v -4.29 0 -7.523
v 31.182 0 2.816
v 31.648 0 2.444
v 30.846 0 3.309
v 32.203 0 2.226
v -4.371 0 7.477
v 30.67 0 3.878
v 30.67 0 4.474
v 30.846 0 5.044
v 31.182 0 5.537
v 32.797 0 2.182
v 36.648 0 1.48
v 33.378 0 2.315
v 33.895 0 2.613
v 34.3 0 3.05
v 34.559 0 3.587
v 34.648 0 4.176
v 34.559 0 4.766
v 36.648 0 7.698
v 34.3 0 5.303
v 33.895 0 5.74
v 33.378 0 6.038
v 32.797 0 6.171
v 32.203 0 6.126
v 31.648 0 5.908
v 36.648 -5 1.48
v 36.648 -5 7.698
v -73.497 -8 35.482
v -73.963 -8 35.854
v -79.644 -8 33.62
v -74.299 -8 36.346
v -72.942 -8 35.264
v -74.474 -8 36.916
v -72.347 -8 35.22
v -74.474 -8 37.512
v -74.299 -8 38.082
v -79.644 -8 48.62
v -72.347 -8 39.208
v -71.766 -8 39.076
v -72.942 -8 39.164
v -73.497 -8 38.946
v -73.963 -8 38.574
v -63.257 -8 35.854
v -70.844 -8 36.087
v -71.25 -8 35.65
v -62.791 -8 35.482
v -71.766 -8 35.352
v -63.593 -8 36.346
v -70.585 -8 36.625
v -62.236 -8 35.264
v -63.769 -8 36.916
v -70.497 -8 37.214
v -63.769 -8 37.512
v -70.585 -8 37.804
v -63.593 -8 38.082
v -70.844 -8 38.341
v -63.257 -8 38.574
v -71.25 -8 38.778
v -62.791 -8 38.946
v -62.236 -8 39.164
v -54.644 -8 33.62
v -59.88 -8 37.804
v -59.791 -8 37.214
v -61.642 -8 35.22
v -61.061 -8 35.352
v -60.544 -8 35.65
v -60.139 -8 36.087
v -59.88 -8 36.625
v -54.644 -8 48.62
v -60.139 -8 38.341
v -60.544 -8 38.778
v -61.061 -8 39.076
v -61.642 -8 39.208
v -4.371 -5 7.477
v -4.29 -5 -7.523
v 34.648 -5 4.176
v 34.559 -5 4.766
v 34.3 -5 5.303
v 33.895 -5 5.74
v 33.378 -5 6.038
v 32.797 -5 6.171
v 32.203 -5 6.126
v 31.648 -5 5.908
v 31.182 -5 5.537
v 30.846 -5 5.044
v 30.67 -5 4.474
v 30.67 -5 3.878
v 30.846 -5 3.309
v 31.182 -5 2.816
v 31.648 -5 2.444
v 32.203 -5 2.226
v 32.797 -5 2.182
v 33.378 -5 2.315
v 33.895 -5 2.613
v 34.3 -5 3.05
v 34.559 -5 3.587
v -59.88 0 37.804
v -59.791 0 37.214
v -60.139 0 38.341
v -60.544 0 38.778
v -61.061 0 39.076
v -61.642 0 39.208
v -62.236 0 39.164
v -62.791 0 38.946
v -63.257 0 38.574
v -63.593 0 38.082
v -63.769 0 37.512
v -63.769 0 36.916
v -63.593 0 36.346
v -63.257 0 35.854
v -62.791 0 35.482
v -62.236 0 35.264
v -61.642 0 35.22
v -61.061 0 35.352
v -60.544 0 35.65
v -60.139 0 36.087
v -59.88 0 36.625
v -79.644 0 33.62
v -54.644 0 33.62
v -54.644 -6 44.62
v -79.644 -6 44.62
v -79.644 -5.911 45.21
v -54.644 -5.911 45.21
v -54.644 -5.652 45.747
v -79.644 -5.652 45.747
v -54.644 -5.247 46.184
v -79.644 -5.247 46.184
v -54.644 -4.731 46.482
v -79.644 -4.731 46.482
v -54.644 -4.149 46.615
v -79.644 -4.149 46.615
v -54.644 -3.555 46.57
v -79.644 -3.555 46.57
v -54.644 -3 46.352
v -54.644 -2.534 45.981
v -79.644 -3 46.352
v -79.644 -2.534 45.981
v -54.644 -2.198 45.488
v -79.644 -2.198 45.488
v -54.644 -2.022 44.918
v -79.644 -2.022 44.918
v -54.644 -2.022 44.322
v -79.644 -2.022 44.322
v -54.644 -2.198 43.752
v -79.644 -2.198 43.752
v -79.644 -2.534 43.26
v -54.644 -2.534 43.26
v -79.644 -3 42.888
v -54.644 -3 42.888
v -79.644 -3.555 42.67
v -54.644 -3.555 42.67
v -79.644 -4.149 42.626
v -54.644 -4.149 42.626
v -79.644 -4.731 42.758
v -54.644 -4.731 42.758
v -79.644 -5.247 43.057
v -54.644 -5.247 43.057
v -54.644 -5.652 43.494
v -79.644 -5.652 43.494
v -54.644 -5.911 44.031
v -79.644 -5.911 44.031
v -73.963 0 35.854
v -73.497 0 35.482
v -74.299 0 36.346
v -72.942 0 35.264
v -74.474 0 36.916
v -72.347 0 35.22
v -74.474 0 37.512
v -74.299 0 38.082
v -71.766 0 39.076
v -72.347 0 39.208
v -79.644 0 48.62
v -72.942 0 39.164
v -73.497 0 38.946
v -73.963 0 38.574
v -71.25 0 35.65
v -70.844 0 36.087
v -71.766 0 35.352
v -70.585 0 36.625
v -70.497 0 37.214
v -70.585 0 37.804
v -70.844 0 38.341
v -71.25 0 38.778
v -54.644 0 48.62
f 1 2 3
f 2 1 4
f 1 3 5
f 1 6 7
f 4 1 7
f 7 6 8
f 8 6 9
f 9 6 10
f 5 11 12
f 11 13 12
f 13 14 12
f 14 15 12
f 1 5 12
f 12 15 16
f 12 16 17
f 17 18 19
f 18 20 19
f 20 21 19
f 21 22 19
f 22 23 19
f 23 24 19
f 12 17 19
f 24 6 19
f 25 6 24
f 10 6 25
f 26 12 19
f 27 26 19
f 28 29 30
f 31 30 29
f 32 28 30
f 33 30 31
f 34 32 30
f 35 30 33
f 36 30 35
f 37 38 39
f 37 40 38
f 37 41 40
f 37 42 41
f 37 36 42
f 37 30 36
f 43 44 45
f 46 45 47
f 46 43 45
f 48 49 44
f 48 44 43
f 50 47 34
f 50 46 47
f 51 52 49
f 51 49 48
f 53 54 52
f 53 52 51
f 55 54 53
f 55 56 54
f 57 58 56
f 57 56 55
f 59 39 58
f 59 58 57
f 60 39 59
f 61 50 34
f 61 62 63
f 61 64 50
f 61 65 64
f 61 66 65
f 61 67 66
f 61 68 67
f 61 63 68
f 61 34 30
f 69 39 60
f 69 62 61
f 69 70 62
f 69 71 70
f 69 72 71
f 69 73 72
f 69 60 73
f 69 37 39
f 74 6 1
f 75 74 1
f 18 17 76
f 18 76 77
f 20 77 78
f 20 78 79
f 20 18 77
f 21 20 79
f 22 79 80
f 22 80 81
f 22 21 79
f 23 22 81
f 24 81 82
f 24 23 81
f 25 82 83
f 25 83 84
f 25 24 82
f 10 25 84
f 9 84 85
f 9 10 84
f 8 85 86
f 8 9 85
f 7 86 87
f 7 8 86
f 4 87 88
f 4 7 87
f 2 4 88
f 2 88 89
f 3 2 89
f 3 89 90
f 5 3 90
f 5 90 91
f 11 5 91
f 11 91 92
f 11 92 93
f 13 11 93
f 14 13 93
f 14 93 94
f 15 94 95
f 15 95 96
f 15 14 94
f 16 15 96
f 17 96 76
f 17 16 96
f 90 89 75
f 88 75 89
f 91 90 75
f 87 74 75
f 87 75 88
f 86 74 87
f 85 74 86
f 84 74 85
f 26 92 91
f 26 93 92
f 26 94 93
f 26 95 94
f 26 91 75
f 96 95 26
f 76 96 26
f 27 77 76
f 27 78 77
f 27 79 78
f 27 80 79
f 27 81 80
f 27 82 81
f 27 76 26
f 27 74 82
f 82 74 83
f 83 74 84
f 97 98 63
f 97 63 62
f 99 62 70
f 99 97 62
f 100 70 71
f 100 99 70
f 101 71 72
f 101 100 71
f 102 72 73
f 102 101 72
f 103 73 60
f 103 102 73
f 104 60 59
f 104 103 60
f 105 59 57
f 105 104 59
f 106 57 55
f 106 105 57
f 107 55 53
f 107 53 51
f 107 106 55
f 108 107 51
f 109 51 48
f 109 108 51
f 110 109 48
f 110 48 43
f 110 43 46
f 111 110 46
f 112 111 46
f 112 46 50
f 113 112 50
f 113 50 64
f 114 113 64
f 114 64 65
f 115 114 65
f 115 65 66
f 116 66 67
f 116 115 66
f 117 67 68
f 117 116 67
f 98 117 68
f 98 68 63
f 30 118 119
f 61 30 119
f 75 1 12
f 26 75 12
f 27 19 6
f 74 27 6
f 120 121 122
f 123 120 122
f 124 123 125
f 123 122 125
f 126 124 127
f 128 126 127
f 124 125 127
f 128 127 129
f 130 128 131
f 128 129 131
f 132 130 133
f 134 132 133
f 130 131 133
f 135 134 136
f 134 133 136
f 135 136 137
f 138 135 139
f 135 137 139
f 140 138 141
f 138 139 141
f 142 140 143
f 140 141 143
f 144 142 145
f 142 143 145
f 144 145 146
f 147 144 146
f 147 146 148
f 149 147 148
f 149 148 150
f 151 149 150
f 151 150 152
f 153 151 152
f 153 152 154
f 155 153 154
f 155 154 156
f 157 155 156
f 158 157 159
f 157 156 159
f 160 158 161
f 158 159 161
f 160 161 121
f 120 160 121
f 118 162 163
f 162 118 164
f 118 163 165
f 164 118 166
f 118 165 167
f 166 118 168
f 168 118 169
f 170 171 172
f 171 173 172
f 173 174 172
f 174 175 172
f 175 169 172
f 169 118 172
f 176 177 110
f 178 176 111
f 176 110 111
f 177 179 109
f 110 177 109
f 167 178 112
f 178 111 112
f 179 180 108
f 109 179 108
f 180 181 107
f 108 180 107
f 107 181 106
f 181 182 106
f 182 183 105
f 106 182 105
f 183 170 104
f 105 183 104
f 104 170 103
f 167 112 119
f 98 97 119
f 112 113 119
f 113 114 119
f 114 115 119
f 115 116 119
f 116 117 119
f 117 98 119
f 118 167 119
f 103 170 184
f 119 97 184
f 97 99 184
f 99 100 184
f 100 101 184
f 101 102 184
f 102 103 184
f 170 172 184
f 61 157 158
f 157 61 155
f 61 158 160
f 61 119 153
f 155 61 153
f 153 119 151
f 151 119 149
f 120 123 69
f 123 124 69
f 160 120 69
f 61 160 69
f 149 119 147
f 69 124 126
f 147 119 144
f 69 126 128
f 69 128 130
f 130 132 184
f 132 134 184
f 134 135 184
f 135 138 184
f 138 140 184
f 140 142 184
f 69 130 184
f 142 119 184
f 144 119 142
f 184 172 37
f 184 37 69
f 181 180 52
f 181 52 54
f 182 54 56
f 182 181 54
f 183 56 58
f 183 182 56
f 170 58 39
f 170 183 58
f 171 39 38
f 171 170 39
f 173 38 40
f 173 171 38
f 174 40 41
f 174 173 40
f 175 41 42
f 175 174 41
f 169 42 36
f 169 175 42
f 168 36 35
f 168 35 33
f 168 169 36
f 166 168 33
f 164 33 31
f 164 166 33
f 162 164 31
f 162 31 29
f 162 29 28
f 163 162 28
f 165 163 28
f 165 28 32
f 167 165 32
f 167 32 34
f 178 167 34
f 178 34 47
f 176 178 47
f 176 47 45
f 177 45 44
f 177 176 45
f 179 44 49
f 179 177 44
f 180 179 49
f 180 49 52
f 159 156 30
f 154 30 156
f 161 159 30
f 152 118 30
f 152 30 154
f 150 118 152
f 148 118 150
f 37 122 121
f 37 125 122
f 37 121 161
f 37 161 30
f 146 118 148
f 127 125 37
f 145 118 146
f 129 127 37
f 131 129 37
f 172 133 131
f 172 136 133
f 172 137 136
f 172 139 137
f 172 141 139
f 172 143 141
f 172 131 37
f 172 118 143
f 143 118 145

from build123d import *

# Parameters (mm, degrees)
F0_R     = 2
F1_DEPTH = 5
F2_W     = 25
F2_H     = 15
F2_R     = 2
F3_DEPTH = 8
F4_R     = 2
F5_DEPTH = 25


with BuildPart() as f1:
    # F0 (on Front) → F1 (new body)
    with BuildSketch(Plane.XZ):
        Polygon((36.647806, 7.697929), (-4.370547, 7.476518), (-4.289581, -7.523264), (36.647806, 1.480422), align=None)
        with Locations((32.647806, 4.176287)):
            Circle(F0_R, mode=Mode.SUBTRACT)
    extrude(amount=F1_DEPTH)


with BuildPart() as f3:
    # F2 (on Front) → F3 (new body)
    with BuildSketch(Plane.XZ):
        with Locations((-67.143897, 41.120185)):
            Rectangle(F2_W, F2_H)
        with Locations((-72.496566, 37.214023)):
            Circle(F2_R, mode=Mode.SUBTRACT)
        with Locations((-61.791227, 37.214023)):
            Circle(F2_R, mode=Mode.SUBTRACT)
    extrude(amount=F3_DEPTH)

    # F4 (on face) → F5 (cut)
    with BuildSketch(Plane(origin=(-79.643897, 0, 0), x_dir=(0, -1, 0), z_dir=(-1, 0, 0))):
        with Locations((4, 44.620185)):
            Circle(F4_R)
    extrude(amount=-F5_DEPTH, mode=Mode.SUBTRACT)


solid = Compound([f1.part, f3.part])
